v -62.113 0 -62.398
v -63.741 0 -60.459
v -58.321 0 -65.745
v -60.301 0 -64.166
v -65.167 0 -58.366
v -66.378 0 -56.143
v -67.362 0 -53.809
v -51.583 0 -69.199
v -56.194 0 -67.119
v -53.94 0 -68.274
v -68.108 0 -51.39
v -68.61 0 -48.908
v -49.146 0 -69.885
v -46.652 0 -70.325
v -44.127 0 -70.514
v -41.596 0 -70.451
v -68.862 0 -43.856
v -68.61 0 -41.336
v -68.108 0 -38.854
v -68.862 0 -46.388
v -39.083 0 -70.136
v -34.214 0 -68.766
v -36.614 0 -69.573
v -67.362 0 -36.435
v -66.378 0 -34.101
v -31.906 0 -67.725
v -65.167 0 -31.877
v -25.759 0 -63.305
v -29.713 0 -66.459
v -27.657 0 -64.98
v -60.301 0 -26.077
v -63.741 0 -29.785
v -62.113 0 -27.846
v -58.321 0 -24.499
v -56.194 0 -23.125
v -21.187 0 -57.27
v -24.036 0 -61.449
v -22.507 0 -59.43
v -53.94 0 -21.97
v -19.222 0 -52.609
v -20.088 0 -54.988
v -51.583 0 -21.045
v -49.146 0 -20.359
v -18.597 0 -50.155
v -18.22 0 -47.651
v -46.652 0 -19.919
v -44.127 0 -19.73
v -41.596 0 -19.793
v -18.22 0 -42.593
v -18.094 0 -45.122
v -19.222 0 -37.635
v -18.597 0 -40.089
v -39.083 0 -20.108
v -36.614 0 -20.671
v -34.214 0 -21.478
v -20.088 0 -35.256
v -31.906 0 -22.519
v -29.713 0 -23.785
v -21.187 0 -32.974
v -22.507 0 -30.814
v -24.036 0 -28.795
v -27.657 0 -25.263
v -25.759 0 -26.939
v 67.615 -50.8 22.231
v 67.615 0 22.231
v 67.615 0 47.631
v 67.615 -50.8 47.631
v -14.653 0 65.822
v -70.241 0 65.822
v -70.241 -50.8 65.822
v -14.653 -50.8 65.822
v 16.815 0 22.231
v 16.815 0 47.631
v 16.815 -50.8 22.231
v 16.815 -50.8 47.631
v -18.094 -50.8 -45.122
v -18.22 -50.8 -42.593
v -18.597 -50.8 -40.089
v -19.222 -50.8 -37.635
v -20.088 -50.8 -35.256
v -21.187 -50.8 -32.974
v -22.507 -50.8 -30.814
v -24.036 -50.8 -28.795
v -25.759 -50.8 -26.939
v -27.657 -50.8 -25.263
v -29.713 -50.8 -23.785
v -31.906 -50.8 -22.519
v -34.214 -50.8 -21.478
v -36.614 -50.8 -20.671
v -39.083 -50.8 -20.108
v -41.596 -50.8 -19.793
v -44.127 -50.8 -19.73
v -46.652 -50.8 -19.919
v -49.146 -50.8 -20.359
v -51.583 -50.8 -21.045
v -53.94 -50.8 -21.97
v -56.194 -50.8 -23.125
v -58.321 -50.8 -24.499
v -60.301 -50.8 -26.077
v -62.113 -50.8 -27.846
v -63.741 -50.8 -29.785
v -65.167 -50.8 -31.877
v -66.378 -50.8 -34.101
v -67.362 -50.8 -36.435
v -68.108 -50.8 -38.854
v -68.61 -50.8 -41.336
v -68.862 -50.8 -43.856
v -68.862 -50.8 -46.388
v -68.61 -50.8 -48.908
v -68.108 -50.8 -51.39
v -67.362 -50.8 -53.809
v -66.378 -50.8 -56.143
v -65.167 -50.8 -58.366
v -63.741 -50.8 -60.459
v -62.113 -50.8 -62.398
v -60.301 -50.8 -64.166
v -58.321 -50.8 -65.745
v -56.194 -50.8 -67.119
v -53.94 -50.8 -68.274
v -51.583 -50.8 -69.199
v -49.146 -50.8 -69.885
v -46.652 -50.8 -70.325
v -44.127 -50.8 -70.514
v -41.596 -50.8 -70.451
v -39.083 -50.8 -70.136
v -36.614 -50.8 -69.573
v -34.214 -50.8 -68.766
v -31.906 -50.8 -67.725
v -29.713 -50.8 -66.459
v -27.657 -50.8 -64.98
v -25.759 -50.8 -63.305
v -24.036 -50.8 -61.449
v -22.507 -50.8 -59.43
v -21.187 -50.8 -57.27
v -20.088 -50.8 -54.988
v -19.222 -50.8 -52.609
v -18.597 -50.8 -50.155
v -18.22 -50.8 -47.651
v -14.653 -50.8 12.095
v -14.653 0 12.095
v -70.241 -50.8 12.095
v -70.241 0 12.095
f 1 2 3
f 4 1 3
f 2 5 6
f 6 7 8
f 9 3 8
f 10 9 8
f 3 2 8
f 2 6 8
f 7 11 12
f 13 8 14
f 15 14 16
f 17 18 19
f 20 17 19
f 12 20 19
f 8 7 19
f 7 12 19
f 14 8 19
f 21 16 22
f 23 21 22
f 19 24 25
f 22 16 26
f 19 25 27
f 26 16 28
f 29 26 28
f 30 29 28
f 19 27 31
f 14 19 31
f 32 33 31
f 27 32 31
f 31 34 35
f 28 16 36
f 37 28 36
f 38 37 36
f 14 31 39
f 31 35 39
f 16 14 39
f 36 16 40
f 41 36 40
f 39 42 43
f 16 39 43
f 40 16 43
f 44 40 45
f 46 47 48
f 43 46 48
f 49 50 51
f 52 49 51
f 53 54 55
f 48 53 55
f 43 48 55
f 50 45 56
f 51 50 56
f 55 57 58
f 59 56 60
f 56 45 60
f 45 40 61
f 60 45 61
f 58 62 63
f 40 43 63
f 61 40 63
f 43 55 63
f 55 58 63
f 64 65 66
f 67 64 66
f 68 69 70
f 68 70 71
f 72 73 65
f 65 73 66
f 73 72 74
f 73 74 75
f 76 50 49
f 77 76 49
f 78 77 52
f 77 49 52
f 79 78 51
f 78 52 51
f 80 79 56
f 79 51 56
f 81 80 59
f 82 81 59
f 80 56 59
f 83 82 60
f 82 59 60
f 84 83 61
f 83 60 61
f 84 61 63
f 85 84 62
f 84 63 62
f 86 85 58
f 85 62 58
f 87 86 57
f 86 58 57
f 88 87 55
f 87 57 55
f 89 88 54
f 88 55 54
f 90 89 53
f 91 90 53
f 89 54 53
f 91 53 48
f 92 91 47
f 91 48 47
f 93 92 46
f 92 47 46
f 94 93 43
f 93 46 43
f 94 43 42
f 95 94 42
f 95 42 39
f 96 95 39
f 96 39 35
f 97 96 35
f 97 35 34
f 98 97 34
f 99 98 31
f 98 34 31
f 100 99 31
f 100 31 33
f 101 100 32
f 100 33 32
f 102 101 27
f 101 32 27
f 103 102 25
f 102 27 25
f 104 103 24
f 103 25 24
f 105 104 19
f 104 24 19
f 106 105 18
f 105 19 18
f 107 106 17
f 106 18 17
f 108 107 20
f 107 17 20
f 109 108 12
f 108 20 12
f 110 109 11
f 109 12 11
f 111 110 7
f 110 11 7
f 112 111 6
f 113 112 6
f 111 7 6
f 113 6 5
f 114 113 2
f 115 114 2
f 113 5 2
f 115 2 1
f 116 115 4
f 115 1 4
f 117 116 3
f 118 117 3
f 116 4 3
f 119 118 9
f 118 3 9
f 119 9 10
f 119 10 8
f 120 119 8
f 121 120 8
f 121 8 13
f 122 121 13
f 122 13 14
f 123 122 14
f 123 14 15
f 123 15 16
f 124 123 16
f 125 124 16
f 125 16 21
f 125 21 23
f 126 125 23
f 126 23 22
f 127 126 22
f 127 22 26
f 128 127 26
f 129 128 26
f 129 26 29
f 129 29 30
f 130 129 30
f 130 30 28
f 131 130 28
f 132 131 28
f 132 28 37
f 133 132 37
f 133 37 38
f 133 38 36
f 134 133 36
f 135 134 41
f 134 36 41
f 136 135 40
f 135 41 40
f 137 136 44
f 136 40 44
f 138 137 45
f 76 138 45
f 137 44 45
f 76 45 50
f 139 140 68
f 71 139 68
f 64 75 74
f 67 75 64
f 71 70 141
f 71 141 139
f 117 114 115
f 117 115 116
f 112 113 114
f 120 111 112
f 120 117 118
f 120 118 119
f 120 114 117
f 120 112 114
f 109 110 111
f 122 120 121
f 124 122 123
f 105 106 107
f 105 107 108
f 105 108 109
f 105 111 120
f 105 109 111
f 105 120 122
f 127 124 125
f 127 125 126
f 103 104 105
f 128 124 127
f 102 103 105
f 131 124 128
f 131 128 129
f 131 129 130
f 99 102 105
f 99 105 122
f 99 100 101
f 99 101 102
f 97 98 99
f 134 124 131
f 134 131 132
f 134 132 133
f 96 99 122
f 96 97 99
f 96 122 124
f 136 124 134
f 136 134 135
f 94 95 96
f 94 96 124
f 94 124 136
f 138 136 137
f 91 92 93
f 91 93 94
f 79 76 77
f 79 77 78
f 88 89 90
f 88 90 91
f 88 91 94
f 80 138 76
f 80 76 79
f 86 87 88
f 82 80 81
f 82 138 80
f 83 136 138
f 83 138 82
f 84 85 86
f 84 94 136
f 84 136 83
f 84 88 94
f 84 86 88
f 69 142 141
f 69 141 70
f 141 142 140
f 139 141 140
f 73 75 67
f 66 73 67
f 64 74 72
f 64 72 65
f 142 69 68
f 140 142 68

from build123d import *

# Parameters (mm, degrees)
F0_W     = 55.588346
F0_H     = 53.727642
F3_DEPTH = 50.8
F1_W     = 50.8
F1_H     = 25.4
F4_DEPTH = 50.8
F2_R     = 25.4
F5_DEPTH = 50.8


with BuildPart() as f3:
    # F0 (on Front) → F3 (new body)
    with BuildSketch(Plane.XZ):
        with Locations((-42.447167, 38.958356)):
            Rectangle(F0_W, F0_H)
    extrude(amount=F3_DEPTH)


with BuildPart() as f4:
    # F1 (on Front) → F4 (new body)
    with BuildSketch(Plane.XZ):
        with Locations((42.21458, 34.931152)):
            Rectangle(F1_W, F1_H)
    extrude(amount=F4_DEPTH)


with BuildPart() as f5:
    # F2 (on Front) → F5 (new body)
    with BuildSketch(Plane.XZ):
        with Locations((-43.493807, -45.121916)):
            Circle(F2_R)
    extrude(amount=F5_DEPTH)


solid = Compound([f3.part, f4.part, f5.part])
